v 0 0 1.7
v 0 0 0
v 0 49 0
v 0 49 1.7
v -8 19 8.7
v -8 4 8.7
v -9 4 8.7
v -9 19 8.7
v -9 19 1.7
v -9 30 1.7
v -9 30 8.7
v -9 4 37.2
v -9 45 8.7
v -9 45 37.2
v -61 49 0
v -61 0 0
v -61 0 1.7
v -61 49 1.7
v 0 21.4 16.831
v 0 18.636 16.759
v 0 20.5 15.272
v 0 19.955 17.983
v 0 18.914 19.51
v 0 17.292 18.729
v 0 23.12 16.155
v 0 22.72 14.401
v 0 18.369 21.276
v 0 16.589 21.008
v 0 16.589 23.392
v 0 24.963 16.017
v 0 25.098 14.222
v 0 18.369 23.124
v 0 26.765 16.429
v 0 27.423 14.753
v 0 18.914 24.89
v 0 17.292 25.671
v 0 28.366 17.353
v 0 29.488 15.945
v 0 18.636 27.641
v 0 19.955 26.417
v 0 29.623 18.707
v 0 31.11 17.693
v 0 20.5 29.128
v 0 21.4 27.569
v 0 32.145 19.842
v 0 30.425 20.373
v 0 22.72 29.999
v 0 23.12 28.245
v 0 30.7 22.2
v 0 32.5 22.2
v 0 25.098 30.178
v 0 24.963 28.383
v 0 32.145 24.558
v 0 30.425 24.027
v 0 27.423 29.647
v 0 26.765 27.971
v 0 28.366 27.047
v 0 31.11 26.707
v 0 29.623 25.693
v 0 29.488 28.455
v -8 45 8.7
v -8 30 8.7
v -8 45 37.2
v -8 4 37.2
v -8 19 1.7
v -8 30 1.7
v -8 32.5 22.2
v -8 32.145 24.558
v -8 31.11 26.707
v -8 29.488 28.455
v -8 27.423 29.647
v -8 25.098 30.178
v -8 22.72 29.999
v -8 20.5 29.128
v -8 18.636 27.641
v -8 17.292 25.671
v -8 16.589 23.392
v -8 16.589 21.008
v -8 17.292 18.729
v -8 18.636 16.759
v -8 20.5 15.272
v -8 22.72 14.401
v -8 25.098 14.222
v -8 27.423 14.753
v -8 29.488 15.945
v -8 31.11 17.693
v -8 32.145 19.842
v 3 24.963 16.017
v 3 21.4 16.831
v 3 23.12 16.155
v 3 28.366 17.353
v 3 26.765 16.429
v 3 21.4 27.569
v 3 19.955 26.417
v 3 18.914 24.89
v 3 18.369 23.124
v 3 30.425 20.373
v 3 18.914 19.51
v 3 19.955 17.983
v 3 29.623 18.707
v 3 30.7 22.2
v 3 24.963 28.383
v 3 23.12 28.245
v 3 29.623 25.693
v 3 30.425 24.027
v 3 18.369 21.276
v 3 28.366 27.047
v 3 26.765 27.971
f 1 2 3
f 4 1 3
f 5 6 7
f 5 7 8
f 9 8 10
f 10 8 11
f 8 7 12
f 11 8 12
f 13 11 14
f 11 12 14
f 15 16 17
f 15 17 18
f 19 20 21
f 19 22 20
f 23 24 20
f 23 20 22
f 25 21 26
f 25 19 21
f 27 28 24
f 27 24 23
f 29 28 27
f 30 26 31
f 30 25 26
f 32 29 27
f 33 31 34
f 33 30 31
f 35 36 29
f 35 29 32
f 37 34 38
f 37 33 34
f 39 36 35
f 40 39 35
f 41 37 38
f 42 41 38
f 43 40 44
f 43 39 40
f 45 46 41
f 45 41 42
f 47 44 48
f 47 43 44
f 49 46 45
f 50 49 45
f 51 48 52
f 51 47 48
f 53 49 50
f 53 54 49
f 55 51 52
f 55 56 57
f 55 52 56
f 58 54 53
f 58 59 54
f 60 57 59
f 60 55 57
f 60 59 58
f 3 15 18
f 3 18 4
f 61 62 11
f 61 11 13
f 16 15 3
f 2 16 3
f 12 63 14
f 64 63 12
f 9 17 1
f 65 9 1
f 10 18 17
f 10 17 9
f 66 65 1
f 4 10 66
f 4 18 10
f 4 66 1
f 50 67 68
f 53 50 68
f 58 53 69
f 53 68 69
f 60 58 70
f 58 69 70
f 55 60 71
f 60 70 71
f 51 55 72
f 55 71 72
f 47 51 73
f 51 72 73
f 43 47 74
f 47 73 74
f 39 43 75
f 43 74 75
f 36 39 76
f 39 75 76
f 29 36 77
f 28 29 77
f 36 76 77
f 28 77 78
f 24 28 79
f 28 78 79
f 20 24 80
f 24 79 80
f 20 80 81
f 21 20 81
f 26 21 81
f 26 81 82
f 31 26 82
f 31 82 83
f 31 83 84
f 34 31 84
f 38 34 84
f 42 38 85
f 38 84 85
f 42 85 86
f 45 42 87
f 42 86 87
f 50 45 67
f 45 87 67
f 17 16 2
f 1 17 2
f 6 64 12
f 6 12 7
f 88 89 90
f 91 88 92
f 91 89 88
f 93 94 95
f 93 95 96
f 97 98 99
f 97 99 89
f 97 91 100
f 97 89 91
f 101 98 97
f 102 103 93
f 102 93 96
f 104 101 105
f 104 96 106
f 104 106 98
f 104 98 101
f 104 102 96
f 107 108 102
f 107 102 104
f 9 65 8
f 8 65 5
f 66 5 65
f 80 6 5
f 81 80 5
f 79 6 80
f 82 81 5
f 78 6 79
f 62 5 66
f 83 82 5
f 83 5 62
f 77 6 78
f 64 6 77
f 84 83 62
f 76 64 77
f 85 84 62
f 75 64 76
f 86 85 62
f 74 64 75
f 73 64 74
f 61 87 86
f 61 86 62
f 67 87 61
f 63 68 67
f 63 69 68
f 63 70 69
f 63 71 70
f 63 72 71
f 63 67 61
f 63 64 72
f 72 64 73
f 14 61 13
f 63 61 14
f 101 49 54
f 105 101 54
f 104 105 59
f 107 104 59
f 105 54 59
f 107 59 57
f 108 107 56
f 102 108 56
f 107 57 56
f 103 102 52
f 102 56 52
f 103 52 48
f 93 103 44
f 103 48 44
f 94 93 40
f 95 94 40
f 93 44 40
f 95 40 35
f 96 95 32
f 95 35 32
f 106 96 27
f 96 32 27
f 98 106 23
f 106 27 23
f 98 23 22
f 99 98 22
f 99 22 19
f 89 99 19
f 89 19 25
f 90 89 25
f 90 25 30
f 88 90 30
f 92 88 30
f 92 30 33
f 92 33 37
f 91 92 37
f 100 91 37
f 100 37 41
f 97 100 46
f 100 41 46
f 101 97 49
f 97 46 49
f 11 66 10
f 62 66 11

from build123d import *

# Parameters (mm, degrees)
F0_W     = 61
F0_H     = 49
F1_DEPTH = 1.7
F3_W     = 11
F3_H     = 7
F4_DEPTH = 1
F5_R     = 8
F6_DEPTH = 8
F7_R     = 6.2
F8_DEPTH = 3


with BuildPart() as f1:
    # F0 (on Top) → F1 (new body)
    with BuildSketch(Plane.XY):
        with Locations((-30.5, 24.5)):
            Rectangle(F0_W, F0_H)
    extrude(amount=F1_DEPTH)

    # F3 (on offset) → F4 (join)
    with BuildSketch(Plane.YZ.offset(-8)):
        Polygon((4, 8.7), (19, 8.7), (30, 8.7), (45, 8.7), (45, 37.2), (4, 37.2), align=None)
        with Locations((24.5, 5.2)):
            Rectangle(F3_W, F3_H)
    extrude(amount=-F4_DEPTH)

    # F5 (on face) → F6 (join)
    with BuildSketch(Plane.YZ.offset(-8)):
        with Locations((24.5, 22.2)):
            Circle(F5_R)
    extrude(amount=F6_DEPTH)

    # F7 (on face) → F8 (join)
    with BuildSketch(Plane.YZ):
        with Locations((24.5, 22.2)):
            Circle(F7_R)
    extrude(amount=F8_DEPTH)


solid = f1.part
